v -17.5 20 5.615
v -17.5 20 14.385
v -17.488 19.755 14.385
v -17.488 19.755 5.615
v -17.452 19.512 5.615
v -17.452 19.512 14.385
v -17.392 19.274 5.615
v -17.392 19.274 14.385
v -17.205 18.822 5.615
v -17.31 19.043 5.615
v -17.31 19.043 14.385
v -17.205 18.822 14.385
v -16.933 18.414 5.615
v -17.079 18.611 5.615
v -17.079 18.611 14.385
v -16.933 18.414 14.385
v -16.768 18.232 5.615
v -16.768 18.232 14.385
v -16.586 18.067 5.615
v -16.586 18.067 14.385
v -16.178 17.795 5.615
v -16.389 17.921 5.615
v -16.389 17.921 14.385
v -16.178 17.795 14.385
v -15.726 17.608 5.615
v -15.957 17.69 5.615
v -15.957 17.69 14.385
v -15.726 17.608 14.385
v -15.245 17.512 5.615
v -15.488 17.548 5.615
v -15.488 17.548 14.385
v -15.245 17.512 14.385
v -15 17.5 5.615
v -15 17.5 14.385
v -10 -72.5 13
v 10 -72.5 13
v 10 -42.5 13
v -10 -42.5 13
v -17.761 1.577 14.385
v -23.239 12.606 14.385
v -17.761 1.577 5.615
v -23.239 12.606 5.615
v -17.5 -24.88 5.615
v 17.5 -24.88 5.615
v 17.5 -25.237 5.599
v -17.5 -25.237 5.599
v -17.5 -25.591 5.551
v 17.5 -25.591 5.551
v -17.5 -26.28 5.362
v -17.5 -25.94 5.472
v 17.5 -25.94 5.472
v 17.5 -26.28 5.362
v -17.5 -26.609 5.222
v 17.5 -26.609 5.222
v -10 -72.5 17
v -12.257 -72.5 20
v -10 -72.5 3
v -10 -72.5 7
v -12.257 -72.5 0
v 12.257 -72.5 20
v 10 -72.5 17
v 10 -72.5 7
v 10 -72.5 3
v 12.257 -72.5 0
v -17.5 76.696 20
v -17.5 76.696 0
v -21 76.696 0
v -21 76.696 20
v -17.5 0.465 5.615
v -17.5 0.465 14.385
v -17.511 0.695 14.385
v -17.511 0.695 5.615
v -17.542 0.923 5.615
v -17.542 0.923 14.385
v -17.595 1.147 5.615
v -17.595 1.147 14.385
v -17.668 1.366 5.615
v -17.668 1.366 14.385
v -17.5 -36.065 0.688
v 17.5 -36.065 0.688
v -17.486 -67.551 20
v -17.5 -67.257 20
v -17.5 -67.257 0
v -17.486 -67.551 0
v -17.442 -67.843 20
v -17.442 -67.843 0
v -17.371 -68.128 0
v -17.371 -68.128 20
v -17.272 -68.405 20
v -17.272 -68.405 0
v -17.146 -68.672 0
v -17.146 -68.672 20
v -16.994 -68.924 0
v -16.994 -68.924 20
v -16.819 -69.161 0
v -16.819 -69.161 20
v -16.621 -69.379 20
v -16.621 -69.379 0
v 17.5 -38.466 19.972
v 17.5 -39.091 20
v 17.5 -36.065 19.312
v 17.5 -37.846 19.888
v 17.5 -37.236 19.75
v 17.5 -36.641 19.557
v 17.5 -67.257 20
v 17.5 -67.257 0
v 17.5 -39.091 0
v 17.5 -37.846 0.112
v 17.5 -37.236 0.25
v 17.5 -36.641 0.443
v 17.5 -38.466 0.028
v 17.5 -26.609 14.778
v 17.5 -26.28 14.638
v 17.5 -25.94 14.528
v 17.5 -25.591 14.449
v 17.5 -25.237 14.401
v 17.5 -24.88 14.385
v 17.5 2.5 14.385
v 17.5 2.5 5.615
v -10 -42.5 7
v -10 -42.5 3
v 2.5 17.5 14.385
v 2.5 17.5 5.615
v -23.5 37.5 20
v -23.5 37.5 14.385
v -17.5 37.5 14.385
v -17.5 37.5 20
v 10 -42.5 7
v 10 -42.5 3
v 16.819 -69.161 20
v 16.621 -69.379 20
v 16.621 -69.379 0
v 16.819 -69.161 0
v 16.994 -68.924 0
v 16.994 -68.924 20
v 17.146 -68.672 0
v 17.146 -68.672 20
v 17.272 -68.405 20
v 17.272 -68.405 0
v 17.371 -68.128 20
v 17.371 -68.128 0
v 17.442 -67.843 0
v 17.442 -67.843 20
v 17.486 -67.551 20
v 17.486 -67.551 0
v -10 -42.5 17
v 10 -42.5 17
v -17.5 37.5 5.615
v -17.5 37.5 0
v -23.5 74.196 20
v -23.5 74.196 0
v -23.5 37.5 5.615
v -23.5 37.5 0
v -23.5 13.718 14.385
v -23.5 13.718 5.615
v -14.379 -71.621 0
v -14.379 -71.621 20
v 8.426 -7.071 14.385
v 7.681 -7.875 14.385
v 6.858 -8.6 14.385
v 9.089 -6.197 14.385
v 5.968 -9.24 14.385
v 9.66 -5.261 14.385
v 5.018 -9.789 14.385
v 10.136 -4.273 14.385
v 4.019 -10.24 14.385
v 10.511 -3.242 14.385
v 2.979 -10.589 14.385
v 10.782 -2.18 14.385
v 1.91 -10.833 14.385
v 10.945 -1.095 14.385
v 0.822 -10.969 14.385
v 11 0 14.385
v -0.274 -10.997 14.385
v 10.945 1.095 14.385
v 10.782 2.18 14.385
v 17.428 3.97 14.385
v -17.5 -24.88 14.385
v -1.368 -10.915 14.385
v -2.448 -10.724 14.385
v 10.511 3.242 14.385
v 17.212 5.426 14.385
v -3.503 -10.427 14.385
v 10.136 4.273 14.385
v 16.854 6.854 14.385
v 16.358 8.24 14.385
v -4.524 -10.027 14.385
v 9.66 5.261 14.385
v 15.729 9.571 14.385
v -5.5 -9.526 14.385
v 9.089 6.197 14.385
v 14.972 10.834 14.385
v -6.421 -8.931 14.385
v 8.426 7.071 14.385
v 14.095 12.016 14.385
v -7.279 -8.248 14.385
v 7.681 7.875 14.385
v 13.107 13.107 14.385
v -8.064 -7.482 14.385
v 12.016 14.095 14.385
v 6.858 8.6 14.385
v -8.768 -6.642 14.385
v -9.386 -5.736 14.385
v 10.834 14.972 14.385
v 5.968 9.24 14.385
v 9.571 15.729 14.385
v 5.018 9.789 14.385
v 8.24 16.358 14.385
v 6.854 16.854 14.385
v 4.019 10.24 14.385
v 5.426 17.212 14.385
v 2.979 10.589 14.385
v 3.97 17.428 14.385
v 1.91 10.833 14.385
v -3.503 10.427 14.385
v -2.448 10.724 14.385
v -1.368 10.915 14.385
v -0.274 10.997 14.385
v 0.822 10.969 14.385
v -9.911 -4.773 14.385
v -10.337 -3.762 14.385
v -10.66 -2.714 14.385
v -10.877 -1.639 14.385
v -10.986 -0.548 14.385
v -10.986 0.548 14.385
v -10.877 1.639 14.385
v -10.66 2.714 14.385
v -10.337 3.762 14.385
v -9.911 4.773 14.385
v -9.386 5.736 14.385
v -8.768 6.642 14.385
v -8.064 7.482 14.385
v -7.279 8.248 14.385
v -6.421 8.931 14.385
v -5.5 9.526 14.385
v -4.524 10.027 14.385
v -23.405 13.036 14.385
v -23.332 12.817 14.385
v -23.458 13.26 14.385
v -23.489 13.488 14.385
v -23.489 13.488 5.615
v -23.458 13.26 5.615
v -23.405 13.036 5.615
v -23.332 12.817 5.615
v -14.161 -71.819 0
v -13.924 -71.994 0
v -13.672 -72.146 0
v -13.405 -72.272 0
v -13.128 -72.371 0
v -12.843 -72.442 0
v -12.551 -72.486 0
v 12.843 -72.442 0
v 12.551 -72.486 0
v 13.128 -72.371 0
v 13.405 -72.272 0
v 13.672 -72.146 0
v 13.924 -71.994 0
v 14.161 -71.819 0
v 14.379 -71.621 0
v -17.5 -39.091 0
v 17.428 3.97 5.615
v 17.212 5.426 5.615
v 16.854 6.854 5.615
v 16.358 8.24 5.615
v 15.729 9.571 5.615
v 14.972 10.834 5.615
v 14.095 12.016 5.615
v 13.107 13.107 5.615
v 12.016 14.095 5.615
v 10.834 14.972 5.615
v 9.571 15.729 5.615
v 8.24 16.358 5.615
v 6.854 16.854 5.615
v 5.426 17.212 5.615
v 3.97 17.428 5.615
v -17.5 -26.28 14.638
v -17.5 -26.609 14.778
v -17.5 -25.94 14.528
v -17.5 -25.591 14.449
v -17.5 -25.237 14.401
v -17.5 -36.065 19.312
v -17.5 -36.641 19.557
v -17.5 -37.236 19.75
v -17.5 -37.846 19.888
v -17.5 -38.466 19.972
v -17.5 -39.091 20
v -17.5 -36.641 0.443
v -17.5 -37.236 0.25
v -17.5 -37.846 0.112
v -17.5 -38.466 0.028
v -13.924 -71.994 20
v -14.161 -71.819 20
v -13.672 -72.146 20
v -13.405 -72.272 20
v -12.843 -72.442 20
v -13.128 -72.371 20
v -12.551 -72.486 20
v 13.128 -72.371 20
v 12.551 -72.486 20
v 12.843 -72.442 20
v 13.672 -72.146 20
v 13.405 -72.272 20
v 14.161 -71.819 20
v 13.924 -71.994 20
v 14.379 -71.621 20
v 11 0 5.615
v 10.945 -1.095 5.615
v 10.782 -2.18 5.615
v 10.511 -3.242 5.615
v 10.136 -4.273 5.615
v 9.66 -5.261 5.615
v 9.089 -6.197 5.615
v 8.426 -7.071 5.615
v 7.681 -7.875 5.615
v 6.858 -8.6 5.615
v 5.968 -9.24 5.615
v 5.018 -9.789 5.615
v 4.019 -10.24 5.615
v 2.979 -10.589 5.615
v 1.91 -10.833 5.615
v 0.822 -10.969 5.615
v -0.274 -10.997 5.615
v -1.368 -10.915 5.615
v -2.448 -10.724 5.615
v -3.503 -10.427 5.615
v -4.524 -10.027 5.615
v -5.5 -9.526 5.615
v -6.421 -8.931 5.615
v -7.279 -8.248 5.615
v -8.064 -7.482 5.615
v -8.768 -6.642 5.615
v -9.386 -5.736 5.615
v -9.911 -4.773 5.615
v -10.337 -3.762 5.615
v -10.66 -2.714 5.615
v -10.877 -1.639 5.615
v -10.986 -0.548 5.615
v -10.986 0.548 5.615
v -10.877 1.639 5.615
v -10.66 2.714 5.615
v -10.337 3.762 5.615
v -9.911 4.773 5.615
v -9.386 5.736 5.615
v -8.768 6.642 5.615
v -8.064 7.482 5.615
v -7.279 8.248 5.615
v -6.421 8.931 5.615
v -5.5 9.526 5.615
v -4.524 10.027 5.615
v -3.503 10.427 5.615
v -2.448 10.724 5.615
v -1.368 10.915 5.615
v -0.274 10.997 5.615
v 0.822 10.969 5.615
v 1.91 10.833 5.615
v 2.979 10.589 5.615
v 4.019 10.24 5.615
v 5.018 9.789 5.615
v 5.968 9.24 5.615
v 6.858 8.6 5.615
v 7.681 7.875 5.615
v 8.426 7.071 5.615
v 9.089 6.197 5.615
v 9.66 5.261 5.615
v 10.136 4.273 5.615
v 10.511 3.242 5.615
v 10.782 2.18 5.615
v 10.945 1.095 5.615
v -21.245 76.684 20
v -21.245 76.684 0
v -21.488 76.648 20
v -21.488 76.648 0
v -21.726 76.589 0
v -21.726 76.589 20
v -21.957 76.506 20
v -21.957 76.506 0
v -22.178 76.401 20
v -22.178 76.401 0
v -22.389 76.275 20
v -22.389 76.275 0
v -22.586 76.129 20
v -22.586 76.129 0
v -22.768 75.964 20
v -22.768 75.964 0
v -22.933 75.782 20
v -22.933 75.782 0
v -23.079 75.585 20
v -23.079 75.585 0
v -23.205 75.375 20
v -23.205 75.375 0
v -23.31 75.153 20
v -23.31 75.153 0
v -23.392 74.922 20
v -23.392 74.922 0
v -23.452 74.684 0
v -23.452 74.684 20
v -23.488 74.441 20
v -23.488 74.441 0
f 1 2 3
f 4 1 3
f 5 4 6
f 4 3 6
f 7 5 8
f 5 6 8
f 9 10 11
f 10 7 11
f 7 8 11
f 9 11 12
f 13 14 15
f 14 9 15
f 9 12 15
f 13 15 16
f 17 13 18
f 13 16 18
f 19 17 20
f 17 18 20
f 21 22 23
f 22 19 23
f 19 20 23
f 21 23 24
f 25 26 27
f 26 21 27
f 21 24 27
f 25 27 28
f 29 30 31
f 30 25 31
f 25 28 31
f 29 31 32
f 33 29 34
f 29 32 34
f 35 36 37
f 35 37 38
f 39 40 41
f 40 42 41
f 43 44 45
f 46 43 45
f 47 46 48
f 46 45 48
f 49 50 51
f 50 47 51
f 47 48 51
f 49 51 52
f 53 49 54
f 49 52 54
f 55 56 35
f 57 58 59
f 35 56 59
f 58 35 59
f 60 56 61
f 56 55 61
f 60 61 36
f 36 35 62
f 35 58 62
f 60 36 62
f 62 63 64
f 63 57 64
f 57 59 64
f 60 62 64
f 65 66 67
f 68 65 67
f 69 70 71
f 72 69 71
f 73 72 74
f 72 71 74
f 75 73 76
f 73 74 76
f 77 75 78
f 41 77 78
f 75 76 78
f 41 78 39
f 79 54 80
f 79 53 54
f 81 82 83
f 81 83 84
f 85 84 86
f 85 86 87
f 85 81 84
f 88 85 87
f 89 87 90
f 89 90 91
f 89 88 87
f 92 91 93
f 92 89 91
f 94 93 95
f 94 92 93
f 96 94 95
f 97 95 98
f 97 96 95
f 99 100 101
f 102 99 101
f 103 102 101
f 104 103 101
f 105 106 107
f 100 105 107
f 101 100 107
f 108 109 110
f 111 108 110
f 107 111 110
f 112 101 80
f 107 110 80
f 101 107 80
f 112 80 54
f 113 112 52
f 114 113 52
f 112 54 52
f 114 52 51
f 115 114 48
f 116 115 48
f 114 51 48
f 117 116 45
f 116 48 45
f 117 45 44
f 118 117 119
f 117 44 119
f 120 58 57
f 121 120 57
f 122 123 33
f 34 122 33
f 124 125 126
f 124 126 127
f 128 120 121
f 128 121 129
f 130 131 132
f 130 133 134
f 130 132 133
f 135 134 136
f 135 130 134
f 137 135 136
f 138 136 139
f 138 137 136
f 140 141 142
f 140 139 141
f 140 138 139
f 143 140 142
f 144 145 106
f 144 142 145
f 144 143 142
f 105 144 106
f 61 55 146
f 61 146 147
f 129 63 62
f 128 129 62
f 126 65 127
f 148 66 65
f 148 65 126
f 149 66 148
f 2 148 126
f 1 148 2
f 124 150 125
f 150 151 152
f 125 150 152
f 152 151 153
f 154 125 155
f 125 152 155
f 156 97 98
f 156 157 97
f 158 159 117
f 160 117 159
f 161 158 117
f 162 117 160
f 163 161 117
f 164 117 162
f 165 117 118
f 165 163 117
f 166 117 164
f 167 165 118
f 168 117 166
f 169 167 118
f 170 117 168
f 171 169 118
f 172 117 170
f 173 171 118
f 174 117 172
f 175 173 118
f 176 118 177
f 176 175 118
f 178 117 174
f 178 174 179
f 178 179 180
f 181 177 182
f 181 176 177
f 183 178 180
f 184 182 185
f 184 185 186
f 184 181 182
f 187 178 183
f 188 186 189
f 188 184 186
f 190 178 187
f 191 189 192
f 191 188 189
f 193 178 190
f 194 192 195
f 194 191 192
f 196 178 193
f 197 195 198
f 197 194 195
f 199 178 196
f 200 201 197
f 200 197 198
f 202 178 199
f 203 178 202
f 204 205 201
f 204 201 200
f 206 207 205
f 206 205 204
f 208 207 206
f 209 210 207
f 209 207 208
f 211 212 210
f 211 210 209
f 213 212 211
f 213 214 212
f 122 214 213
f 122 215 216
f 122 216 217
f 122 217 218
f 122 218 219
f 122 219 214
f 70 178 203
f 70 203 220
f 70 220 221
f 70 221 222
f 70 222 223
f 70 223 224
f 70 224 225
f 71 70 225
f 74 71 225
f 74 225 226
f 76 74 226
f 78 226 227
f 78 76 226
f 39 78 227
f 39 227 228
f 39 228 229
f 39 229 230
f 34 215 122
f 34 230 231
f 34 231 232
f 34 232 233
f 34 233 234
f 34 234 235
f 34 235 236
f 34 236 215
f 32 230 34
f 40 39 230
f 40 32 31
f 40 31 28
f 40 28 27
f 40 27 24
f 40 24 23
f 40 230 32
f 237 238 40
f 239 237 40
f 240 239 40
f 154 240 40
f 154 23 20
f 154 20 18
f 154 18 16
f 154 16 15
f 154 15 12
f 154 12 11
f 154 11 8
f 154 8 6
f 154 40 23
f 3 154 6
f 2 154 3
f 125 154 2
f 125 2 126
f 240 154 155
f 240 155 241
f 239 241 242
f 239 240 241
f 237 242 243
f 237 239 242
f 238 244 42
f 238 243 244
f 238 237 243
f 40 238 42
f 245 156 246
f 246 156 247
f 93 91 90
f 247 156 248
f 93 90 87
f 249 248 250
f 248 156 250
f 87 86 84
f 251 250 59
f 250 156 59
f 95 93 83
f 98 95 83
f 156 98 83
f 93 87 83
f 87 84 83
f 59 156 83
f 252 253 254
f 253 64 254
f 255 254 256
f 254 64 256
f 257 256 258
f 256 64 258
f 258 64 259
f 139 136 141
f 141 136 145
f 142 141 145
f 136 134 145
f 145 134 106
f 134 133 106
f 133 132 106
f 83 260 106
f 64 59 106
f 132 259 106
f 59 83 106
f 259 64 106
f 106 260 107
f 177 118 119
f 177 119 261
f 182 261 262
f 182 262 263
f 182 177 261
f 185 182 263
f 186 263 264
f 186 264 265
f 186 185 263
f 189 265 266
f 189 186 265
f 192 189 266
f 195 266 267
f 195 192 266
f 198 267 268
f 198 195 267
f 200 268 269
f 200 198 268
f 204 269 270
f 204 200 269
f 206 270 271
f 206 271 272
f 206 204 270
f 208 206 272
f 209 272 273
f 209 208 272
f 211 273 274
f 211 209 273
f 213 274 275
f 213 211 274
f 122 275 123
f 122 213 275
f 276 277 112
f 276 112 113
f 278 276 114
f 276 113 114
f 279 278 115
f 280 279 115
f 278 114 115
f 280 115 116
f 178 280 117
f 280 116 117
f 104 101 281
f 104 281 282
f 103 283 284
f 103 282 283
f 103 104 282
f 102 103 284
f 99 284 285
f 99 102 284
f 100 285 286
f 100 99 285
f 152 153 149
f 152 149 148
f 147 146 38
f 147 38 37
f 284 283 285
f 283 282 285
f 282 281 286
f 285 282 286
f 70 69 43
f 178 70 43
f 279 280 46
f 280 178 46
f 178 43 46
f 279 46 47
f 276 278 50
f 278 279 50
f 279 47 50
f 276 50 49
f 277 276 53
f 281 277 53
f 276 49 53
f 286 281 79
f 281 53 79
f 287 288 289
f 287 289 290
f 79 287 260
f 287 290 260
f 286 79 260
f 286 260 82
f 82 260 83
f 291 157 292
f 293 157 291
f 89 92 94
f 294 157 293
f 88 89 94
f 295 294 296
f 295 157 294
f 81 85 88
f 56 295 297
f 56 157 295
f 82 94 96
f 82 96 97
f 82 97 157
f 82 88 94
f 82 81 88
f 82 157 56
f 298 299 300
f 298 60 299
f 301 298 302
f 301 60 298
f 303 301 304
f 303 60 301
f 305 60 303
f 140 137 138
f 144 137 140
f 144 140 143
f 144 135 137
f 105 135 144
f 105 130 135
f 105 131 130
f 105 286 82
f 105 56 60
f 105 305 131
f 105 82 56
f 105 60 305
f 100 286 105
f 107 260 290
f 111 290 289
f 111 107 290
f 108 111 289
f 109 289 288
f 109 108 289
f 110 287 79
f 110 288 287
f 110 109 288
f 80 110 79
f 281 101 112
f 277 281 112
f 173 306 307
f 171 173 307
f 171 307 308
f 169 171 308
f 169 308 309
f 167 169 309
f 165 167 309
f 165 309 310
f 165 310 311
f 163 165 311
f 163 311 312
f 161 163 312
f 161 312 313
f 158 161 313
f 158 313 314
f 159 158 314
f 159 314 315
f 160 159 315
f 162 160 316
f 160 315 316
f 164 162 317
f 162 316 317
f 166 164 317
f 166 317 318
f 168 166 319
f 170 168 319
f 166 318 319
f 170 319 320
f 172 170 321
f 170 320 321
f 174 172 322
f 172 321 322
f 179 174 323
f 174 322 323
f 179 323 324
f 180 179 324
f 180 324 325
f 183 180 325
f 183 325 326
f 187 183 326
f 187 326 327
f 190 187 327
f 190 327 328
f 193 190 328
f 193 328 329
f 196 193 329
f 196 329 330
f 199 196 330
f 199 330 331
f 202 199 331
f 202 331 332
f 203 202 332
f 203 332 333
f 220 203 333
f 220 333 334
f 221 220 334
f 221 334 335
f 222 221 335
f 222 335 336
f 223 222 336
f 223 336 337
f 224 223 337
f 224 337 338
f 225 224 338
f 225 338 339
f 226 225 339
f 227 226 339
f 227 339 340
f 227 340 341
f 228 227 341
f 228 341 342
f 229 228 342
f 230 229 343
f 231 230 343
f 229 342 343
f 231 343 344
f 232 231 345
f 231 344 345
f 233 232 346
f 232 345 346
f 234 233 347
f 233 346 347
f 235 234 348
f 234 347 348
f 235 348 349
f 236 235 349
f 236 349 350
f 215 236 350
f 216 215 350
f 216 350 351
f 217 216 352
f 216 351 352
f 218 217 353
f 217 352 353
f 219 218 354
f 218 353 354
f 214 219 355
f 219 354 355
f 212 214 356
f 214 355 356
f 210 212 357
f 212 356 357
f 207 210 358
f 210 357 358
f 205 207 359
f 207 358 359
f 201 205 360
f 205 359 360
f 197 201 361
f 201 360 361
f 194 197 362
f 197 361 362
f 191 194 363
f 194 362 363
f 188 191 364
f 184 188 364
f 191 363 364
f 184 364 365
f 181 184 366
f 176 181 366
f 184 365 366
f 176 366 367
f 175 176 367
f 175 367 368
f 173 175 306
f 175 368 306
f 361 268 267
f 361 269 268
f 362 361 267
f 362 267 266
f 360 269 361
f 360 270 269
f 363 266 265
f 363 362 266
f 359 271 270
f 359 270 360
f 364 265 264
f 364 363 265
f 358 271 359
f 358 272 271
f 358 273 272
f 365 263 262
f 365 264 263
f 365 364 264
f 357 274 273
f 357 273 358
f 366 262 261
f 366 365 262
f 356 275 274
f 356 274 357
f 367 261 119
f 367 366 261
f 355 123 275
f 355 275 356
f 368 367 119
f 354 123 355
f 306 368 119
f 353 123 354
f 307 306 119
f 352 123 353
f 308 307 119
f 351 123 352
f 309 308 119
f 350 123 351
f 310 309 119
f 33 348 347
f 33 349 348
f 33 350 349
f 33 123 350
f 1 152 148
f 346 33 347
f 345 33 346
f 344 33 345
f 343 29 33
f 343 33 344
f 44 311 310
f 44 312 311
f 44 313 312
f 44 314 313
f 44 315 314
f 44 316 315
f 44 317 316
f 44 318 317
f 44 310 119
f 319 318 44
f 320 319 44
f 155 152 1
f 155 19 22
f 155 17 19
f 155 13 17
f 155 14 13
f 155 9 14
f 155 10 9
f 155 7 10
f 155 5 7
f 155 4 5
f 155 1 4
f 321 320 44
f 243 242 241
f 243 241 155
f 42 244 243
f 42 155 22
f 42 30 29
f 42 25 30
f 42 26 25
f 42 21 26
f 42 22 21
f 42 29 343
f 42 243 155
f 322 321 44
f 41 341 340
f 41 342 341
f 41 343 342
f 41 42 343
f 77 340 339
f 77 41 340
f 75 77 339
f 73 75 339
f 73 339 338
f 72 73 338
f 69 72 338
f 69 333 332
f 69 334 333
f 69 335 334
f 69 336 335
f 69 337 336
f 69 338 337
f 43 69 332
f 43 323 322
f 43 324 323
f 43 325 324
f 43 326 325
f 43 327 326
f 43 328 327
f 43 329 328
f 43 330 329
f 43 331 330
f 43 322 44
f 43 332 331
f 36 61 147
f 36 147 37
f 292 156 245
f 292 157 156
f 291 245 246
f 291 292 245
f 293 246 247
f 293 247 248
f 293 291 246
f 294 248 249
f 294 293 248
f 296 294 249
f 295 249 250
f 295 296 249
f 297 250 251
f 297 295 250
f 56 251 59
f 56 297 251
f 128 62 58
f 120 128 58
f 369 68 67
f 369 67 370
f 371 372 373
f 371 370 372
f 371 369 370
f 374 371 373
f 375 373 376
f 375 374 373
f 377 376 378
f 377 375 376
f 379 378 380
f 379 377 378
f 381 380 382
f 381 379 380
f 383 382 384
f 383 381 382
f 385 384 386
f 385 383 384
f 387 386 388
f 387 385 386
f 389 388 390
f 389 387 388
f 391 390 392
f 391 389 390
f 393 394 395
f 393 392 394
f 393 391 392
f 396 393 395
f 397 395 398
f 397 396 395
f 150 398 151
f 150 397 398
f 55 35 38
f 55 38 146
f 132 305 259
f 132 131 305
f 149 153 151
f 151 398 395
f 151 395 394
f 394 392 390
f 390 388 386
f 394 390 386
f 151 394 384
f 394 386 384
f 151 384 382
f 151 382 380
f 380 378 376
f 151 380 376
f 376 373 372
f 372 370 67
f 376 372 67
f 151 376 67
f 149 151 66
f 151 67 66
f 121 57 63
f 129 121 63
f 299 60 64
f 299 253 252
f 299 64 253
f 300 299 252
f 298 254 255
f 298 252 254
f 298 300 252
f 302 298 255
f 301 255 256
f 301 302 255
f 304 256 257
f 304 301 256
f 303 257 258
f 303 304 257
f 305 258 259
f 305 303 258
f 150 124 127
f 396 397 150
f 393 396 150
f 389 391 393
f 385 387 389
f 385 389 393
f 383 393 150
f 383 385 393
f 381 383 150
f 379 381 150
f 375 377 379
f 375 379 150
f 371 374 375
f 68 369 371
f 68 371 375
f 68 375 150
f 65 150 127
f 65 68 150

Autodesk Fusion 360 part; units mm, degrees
sketch "Sketch1" plane through (0, 0, 0) normal (0, 0, 1) x (1, 0, 0)
  circle A0 centre (0, 0) radius 11
  line L0 (-17.5, -72.5) -> (17.5, -72.5)
  line L1 (17.5, -72.5) -> (17.5, 17.5)
  line L2 (17.5, 17.5) -> (-17.5, 17.5)
  line L3 (-17.5, 17.5) -> (-17.5, -72.5)
  line L4 (-17.5, 76.6964) -> (-17.5, 51.5115)
  line L5 (-17.5, 51.5115) -> (-17.5, 17.5)
  line L6 (-23.5, 76.6964) -> (-23.5, 13.1317)
  line L7 (-23.5, 13.1317) -> (-17.5, 1.0512)
  line L8 (-17.5, 76.6964) -> (-23.5, 76.6964)
  dimension "d1" = 22
  dimension "d2" = 90
  dimension "d3" = 35
  dimension "d4" = 17.5
  dimension "d10" = 17.5
  dimension "d47" = 6
  dimension "d48" = 6
  dimension "d49" = 6
extrude "Extrude1" add sketch "Sketch1" along normal blind 20
sketch "Sketch4" plane through (-23.5, 0, 0) normal (-1, 0, 0) x (0, -1, 0)
  line L0 (-1.0512, 0) -> (72.5, 0)
  line L1 (72.5, 0) -> (72.5, 20)
  line L2 (72.5, 20) -> (-1.0512, 20)
  line L3 (72.5, 0) -> (72.5, 20)
  line L4 (37.5, 20) -> (25.7892, 14.3853)
  line L5 (25.7892, 14.3853) -> (-37.5, 14.3853)
  line L6 (-37.5, 14.3853) -> (-37.5, 5.6147)
  line L7 (-37.5, 5.6147) -> (25.7892, 5.6147)
  line L8 (25.7892, 5.6147) -> (37.5, 0)
  line L9 (72.5, 0) -> (72.5, 20)
  line L10 (-17.5, 0) -> (72.5, 0)
  line L11 (37.5, 20) -> (72.5, 20)
  line L12 (72.5, 0) -> (37.5, 0)
  line L13 (-37.5, 14.3853) -> (-37.5, 20)
  line L14 (-1.0512, 20) -> (-1.0512, 0)
  line L15 (-37.5, 0) -> (-37.5, 5.6147)
  line L16 (-1.0512, 20) -> (-1.0512, 0)
  line L17 (-76.6964, 0) -> (-13.1317, 0)
  line L18 (-13.1317, 0) -> (-13.1317, 20)
  line L19 (-13.1317, 20) -> (-76.6964, 20)
  line L20 (-76.6964, 20) -> (-76.6964, 0)
  line L21 (-13.1317, 20) -> (-1.0512, 20)
  dimension "d16" = 110
  dimension "d17" = 35
  dimension "d40" = 5.6147
  dimension "d41" = 8.7705
extrude "Extrude2" cut sketch "Sketch4" against normal blind 52 contours L0 L7 L8 L10 L14 L16 | L7 L10 L14 L16 L18 | L7 L10 L15 L17 L18 | L2 L4 L5 L14 L16 | L5 L14 L16 L18 L21 | L5 L13 L18 L19
chamfer "Chamfer1" distance 4 angle 45 2 edges at (-17.5, -72.5, 10) (17.5, -72.5, 10)
sketch "Sketch6" plane through (0, -72.5, 0) normal (0, -1, 0) x (1, 0, 0)
  line L0 (13.5, 0) -> (13.5, 20)
  line L1 (13.5, 20) -> (-13.5, 20)
  line L2 (-13.5, 20) -> (-13.5, 0)
  line L3 (-13.5, 0) -> (13.5, 0)
  line L4 (-10, 17) -> (10, 17)
  line L5 (10, 13) -> (-10, 13)
  line L6 (-10, 13) -> (-10, 17)
  line L7 (10, 3) -> (10, 7)
  line L8 (10, 7) -> (-10, 7)
  line L9 (-10, 7) -> (-10, 3)
  line L10 (-10, 3) -> (10, 3)
  line L11 (10, 17) -> (10, 13)
  dimension "d25" = 20
  dimension "d26" = 4
extrude "Extrude3" cut sketch "Sketch6" against normal blind 30 contours L4 L5 L6 L11 | L7 L8 L9 L10
fillet "Fillet1" radius 4 2 edges at (0, -25.7892, 14.3853) (0, -25.7892, 5.6147)
fillet "Fillet2" radius 7 2 edges at (0, -37.5, 20) (0, -37.5, 0)
fillet "Fillet3" radius 15 1 edges at (17.5, 17.5, 10)
fillet "Fillet4" radius 3 4 edges at (-17.5, -68.5, 10) (-13.5, -72.5, 10) (17.5, -68.5, 10) (13.5, -72.5, 10)
fillet "Fillet6" radius 2.5 3 edges at (-17.5, 1.0512, 10) (-23.5, 13.1317, 10) (-23.5, 76.6964, 10)
fillet "Fillet6" radius 2.5 1 edges at (-17.5, 17.5, 10)
equation "d40 = ( 20 mm - d41 ) / 2"
